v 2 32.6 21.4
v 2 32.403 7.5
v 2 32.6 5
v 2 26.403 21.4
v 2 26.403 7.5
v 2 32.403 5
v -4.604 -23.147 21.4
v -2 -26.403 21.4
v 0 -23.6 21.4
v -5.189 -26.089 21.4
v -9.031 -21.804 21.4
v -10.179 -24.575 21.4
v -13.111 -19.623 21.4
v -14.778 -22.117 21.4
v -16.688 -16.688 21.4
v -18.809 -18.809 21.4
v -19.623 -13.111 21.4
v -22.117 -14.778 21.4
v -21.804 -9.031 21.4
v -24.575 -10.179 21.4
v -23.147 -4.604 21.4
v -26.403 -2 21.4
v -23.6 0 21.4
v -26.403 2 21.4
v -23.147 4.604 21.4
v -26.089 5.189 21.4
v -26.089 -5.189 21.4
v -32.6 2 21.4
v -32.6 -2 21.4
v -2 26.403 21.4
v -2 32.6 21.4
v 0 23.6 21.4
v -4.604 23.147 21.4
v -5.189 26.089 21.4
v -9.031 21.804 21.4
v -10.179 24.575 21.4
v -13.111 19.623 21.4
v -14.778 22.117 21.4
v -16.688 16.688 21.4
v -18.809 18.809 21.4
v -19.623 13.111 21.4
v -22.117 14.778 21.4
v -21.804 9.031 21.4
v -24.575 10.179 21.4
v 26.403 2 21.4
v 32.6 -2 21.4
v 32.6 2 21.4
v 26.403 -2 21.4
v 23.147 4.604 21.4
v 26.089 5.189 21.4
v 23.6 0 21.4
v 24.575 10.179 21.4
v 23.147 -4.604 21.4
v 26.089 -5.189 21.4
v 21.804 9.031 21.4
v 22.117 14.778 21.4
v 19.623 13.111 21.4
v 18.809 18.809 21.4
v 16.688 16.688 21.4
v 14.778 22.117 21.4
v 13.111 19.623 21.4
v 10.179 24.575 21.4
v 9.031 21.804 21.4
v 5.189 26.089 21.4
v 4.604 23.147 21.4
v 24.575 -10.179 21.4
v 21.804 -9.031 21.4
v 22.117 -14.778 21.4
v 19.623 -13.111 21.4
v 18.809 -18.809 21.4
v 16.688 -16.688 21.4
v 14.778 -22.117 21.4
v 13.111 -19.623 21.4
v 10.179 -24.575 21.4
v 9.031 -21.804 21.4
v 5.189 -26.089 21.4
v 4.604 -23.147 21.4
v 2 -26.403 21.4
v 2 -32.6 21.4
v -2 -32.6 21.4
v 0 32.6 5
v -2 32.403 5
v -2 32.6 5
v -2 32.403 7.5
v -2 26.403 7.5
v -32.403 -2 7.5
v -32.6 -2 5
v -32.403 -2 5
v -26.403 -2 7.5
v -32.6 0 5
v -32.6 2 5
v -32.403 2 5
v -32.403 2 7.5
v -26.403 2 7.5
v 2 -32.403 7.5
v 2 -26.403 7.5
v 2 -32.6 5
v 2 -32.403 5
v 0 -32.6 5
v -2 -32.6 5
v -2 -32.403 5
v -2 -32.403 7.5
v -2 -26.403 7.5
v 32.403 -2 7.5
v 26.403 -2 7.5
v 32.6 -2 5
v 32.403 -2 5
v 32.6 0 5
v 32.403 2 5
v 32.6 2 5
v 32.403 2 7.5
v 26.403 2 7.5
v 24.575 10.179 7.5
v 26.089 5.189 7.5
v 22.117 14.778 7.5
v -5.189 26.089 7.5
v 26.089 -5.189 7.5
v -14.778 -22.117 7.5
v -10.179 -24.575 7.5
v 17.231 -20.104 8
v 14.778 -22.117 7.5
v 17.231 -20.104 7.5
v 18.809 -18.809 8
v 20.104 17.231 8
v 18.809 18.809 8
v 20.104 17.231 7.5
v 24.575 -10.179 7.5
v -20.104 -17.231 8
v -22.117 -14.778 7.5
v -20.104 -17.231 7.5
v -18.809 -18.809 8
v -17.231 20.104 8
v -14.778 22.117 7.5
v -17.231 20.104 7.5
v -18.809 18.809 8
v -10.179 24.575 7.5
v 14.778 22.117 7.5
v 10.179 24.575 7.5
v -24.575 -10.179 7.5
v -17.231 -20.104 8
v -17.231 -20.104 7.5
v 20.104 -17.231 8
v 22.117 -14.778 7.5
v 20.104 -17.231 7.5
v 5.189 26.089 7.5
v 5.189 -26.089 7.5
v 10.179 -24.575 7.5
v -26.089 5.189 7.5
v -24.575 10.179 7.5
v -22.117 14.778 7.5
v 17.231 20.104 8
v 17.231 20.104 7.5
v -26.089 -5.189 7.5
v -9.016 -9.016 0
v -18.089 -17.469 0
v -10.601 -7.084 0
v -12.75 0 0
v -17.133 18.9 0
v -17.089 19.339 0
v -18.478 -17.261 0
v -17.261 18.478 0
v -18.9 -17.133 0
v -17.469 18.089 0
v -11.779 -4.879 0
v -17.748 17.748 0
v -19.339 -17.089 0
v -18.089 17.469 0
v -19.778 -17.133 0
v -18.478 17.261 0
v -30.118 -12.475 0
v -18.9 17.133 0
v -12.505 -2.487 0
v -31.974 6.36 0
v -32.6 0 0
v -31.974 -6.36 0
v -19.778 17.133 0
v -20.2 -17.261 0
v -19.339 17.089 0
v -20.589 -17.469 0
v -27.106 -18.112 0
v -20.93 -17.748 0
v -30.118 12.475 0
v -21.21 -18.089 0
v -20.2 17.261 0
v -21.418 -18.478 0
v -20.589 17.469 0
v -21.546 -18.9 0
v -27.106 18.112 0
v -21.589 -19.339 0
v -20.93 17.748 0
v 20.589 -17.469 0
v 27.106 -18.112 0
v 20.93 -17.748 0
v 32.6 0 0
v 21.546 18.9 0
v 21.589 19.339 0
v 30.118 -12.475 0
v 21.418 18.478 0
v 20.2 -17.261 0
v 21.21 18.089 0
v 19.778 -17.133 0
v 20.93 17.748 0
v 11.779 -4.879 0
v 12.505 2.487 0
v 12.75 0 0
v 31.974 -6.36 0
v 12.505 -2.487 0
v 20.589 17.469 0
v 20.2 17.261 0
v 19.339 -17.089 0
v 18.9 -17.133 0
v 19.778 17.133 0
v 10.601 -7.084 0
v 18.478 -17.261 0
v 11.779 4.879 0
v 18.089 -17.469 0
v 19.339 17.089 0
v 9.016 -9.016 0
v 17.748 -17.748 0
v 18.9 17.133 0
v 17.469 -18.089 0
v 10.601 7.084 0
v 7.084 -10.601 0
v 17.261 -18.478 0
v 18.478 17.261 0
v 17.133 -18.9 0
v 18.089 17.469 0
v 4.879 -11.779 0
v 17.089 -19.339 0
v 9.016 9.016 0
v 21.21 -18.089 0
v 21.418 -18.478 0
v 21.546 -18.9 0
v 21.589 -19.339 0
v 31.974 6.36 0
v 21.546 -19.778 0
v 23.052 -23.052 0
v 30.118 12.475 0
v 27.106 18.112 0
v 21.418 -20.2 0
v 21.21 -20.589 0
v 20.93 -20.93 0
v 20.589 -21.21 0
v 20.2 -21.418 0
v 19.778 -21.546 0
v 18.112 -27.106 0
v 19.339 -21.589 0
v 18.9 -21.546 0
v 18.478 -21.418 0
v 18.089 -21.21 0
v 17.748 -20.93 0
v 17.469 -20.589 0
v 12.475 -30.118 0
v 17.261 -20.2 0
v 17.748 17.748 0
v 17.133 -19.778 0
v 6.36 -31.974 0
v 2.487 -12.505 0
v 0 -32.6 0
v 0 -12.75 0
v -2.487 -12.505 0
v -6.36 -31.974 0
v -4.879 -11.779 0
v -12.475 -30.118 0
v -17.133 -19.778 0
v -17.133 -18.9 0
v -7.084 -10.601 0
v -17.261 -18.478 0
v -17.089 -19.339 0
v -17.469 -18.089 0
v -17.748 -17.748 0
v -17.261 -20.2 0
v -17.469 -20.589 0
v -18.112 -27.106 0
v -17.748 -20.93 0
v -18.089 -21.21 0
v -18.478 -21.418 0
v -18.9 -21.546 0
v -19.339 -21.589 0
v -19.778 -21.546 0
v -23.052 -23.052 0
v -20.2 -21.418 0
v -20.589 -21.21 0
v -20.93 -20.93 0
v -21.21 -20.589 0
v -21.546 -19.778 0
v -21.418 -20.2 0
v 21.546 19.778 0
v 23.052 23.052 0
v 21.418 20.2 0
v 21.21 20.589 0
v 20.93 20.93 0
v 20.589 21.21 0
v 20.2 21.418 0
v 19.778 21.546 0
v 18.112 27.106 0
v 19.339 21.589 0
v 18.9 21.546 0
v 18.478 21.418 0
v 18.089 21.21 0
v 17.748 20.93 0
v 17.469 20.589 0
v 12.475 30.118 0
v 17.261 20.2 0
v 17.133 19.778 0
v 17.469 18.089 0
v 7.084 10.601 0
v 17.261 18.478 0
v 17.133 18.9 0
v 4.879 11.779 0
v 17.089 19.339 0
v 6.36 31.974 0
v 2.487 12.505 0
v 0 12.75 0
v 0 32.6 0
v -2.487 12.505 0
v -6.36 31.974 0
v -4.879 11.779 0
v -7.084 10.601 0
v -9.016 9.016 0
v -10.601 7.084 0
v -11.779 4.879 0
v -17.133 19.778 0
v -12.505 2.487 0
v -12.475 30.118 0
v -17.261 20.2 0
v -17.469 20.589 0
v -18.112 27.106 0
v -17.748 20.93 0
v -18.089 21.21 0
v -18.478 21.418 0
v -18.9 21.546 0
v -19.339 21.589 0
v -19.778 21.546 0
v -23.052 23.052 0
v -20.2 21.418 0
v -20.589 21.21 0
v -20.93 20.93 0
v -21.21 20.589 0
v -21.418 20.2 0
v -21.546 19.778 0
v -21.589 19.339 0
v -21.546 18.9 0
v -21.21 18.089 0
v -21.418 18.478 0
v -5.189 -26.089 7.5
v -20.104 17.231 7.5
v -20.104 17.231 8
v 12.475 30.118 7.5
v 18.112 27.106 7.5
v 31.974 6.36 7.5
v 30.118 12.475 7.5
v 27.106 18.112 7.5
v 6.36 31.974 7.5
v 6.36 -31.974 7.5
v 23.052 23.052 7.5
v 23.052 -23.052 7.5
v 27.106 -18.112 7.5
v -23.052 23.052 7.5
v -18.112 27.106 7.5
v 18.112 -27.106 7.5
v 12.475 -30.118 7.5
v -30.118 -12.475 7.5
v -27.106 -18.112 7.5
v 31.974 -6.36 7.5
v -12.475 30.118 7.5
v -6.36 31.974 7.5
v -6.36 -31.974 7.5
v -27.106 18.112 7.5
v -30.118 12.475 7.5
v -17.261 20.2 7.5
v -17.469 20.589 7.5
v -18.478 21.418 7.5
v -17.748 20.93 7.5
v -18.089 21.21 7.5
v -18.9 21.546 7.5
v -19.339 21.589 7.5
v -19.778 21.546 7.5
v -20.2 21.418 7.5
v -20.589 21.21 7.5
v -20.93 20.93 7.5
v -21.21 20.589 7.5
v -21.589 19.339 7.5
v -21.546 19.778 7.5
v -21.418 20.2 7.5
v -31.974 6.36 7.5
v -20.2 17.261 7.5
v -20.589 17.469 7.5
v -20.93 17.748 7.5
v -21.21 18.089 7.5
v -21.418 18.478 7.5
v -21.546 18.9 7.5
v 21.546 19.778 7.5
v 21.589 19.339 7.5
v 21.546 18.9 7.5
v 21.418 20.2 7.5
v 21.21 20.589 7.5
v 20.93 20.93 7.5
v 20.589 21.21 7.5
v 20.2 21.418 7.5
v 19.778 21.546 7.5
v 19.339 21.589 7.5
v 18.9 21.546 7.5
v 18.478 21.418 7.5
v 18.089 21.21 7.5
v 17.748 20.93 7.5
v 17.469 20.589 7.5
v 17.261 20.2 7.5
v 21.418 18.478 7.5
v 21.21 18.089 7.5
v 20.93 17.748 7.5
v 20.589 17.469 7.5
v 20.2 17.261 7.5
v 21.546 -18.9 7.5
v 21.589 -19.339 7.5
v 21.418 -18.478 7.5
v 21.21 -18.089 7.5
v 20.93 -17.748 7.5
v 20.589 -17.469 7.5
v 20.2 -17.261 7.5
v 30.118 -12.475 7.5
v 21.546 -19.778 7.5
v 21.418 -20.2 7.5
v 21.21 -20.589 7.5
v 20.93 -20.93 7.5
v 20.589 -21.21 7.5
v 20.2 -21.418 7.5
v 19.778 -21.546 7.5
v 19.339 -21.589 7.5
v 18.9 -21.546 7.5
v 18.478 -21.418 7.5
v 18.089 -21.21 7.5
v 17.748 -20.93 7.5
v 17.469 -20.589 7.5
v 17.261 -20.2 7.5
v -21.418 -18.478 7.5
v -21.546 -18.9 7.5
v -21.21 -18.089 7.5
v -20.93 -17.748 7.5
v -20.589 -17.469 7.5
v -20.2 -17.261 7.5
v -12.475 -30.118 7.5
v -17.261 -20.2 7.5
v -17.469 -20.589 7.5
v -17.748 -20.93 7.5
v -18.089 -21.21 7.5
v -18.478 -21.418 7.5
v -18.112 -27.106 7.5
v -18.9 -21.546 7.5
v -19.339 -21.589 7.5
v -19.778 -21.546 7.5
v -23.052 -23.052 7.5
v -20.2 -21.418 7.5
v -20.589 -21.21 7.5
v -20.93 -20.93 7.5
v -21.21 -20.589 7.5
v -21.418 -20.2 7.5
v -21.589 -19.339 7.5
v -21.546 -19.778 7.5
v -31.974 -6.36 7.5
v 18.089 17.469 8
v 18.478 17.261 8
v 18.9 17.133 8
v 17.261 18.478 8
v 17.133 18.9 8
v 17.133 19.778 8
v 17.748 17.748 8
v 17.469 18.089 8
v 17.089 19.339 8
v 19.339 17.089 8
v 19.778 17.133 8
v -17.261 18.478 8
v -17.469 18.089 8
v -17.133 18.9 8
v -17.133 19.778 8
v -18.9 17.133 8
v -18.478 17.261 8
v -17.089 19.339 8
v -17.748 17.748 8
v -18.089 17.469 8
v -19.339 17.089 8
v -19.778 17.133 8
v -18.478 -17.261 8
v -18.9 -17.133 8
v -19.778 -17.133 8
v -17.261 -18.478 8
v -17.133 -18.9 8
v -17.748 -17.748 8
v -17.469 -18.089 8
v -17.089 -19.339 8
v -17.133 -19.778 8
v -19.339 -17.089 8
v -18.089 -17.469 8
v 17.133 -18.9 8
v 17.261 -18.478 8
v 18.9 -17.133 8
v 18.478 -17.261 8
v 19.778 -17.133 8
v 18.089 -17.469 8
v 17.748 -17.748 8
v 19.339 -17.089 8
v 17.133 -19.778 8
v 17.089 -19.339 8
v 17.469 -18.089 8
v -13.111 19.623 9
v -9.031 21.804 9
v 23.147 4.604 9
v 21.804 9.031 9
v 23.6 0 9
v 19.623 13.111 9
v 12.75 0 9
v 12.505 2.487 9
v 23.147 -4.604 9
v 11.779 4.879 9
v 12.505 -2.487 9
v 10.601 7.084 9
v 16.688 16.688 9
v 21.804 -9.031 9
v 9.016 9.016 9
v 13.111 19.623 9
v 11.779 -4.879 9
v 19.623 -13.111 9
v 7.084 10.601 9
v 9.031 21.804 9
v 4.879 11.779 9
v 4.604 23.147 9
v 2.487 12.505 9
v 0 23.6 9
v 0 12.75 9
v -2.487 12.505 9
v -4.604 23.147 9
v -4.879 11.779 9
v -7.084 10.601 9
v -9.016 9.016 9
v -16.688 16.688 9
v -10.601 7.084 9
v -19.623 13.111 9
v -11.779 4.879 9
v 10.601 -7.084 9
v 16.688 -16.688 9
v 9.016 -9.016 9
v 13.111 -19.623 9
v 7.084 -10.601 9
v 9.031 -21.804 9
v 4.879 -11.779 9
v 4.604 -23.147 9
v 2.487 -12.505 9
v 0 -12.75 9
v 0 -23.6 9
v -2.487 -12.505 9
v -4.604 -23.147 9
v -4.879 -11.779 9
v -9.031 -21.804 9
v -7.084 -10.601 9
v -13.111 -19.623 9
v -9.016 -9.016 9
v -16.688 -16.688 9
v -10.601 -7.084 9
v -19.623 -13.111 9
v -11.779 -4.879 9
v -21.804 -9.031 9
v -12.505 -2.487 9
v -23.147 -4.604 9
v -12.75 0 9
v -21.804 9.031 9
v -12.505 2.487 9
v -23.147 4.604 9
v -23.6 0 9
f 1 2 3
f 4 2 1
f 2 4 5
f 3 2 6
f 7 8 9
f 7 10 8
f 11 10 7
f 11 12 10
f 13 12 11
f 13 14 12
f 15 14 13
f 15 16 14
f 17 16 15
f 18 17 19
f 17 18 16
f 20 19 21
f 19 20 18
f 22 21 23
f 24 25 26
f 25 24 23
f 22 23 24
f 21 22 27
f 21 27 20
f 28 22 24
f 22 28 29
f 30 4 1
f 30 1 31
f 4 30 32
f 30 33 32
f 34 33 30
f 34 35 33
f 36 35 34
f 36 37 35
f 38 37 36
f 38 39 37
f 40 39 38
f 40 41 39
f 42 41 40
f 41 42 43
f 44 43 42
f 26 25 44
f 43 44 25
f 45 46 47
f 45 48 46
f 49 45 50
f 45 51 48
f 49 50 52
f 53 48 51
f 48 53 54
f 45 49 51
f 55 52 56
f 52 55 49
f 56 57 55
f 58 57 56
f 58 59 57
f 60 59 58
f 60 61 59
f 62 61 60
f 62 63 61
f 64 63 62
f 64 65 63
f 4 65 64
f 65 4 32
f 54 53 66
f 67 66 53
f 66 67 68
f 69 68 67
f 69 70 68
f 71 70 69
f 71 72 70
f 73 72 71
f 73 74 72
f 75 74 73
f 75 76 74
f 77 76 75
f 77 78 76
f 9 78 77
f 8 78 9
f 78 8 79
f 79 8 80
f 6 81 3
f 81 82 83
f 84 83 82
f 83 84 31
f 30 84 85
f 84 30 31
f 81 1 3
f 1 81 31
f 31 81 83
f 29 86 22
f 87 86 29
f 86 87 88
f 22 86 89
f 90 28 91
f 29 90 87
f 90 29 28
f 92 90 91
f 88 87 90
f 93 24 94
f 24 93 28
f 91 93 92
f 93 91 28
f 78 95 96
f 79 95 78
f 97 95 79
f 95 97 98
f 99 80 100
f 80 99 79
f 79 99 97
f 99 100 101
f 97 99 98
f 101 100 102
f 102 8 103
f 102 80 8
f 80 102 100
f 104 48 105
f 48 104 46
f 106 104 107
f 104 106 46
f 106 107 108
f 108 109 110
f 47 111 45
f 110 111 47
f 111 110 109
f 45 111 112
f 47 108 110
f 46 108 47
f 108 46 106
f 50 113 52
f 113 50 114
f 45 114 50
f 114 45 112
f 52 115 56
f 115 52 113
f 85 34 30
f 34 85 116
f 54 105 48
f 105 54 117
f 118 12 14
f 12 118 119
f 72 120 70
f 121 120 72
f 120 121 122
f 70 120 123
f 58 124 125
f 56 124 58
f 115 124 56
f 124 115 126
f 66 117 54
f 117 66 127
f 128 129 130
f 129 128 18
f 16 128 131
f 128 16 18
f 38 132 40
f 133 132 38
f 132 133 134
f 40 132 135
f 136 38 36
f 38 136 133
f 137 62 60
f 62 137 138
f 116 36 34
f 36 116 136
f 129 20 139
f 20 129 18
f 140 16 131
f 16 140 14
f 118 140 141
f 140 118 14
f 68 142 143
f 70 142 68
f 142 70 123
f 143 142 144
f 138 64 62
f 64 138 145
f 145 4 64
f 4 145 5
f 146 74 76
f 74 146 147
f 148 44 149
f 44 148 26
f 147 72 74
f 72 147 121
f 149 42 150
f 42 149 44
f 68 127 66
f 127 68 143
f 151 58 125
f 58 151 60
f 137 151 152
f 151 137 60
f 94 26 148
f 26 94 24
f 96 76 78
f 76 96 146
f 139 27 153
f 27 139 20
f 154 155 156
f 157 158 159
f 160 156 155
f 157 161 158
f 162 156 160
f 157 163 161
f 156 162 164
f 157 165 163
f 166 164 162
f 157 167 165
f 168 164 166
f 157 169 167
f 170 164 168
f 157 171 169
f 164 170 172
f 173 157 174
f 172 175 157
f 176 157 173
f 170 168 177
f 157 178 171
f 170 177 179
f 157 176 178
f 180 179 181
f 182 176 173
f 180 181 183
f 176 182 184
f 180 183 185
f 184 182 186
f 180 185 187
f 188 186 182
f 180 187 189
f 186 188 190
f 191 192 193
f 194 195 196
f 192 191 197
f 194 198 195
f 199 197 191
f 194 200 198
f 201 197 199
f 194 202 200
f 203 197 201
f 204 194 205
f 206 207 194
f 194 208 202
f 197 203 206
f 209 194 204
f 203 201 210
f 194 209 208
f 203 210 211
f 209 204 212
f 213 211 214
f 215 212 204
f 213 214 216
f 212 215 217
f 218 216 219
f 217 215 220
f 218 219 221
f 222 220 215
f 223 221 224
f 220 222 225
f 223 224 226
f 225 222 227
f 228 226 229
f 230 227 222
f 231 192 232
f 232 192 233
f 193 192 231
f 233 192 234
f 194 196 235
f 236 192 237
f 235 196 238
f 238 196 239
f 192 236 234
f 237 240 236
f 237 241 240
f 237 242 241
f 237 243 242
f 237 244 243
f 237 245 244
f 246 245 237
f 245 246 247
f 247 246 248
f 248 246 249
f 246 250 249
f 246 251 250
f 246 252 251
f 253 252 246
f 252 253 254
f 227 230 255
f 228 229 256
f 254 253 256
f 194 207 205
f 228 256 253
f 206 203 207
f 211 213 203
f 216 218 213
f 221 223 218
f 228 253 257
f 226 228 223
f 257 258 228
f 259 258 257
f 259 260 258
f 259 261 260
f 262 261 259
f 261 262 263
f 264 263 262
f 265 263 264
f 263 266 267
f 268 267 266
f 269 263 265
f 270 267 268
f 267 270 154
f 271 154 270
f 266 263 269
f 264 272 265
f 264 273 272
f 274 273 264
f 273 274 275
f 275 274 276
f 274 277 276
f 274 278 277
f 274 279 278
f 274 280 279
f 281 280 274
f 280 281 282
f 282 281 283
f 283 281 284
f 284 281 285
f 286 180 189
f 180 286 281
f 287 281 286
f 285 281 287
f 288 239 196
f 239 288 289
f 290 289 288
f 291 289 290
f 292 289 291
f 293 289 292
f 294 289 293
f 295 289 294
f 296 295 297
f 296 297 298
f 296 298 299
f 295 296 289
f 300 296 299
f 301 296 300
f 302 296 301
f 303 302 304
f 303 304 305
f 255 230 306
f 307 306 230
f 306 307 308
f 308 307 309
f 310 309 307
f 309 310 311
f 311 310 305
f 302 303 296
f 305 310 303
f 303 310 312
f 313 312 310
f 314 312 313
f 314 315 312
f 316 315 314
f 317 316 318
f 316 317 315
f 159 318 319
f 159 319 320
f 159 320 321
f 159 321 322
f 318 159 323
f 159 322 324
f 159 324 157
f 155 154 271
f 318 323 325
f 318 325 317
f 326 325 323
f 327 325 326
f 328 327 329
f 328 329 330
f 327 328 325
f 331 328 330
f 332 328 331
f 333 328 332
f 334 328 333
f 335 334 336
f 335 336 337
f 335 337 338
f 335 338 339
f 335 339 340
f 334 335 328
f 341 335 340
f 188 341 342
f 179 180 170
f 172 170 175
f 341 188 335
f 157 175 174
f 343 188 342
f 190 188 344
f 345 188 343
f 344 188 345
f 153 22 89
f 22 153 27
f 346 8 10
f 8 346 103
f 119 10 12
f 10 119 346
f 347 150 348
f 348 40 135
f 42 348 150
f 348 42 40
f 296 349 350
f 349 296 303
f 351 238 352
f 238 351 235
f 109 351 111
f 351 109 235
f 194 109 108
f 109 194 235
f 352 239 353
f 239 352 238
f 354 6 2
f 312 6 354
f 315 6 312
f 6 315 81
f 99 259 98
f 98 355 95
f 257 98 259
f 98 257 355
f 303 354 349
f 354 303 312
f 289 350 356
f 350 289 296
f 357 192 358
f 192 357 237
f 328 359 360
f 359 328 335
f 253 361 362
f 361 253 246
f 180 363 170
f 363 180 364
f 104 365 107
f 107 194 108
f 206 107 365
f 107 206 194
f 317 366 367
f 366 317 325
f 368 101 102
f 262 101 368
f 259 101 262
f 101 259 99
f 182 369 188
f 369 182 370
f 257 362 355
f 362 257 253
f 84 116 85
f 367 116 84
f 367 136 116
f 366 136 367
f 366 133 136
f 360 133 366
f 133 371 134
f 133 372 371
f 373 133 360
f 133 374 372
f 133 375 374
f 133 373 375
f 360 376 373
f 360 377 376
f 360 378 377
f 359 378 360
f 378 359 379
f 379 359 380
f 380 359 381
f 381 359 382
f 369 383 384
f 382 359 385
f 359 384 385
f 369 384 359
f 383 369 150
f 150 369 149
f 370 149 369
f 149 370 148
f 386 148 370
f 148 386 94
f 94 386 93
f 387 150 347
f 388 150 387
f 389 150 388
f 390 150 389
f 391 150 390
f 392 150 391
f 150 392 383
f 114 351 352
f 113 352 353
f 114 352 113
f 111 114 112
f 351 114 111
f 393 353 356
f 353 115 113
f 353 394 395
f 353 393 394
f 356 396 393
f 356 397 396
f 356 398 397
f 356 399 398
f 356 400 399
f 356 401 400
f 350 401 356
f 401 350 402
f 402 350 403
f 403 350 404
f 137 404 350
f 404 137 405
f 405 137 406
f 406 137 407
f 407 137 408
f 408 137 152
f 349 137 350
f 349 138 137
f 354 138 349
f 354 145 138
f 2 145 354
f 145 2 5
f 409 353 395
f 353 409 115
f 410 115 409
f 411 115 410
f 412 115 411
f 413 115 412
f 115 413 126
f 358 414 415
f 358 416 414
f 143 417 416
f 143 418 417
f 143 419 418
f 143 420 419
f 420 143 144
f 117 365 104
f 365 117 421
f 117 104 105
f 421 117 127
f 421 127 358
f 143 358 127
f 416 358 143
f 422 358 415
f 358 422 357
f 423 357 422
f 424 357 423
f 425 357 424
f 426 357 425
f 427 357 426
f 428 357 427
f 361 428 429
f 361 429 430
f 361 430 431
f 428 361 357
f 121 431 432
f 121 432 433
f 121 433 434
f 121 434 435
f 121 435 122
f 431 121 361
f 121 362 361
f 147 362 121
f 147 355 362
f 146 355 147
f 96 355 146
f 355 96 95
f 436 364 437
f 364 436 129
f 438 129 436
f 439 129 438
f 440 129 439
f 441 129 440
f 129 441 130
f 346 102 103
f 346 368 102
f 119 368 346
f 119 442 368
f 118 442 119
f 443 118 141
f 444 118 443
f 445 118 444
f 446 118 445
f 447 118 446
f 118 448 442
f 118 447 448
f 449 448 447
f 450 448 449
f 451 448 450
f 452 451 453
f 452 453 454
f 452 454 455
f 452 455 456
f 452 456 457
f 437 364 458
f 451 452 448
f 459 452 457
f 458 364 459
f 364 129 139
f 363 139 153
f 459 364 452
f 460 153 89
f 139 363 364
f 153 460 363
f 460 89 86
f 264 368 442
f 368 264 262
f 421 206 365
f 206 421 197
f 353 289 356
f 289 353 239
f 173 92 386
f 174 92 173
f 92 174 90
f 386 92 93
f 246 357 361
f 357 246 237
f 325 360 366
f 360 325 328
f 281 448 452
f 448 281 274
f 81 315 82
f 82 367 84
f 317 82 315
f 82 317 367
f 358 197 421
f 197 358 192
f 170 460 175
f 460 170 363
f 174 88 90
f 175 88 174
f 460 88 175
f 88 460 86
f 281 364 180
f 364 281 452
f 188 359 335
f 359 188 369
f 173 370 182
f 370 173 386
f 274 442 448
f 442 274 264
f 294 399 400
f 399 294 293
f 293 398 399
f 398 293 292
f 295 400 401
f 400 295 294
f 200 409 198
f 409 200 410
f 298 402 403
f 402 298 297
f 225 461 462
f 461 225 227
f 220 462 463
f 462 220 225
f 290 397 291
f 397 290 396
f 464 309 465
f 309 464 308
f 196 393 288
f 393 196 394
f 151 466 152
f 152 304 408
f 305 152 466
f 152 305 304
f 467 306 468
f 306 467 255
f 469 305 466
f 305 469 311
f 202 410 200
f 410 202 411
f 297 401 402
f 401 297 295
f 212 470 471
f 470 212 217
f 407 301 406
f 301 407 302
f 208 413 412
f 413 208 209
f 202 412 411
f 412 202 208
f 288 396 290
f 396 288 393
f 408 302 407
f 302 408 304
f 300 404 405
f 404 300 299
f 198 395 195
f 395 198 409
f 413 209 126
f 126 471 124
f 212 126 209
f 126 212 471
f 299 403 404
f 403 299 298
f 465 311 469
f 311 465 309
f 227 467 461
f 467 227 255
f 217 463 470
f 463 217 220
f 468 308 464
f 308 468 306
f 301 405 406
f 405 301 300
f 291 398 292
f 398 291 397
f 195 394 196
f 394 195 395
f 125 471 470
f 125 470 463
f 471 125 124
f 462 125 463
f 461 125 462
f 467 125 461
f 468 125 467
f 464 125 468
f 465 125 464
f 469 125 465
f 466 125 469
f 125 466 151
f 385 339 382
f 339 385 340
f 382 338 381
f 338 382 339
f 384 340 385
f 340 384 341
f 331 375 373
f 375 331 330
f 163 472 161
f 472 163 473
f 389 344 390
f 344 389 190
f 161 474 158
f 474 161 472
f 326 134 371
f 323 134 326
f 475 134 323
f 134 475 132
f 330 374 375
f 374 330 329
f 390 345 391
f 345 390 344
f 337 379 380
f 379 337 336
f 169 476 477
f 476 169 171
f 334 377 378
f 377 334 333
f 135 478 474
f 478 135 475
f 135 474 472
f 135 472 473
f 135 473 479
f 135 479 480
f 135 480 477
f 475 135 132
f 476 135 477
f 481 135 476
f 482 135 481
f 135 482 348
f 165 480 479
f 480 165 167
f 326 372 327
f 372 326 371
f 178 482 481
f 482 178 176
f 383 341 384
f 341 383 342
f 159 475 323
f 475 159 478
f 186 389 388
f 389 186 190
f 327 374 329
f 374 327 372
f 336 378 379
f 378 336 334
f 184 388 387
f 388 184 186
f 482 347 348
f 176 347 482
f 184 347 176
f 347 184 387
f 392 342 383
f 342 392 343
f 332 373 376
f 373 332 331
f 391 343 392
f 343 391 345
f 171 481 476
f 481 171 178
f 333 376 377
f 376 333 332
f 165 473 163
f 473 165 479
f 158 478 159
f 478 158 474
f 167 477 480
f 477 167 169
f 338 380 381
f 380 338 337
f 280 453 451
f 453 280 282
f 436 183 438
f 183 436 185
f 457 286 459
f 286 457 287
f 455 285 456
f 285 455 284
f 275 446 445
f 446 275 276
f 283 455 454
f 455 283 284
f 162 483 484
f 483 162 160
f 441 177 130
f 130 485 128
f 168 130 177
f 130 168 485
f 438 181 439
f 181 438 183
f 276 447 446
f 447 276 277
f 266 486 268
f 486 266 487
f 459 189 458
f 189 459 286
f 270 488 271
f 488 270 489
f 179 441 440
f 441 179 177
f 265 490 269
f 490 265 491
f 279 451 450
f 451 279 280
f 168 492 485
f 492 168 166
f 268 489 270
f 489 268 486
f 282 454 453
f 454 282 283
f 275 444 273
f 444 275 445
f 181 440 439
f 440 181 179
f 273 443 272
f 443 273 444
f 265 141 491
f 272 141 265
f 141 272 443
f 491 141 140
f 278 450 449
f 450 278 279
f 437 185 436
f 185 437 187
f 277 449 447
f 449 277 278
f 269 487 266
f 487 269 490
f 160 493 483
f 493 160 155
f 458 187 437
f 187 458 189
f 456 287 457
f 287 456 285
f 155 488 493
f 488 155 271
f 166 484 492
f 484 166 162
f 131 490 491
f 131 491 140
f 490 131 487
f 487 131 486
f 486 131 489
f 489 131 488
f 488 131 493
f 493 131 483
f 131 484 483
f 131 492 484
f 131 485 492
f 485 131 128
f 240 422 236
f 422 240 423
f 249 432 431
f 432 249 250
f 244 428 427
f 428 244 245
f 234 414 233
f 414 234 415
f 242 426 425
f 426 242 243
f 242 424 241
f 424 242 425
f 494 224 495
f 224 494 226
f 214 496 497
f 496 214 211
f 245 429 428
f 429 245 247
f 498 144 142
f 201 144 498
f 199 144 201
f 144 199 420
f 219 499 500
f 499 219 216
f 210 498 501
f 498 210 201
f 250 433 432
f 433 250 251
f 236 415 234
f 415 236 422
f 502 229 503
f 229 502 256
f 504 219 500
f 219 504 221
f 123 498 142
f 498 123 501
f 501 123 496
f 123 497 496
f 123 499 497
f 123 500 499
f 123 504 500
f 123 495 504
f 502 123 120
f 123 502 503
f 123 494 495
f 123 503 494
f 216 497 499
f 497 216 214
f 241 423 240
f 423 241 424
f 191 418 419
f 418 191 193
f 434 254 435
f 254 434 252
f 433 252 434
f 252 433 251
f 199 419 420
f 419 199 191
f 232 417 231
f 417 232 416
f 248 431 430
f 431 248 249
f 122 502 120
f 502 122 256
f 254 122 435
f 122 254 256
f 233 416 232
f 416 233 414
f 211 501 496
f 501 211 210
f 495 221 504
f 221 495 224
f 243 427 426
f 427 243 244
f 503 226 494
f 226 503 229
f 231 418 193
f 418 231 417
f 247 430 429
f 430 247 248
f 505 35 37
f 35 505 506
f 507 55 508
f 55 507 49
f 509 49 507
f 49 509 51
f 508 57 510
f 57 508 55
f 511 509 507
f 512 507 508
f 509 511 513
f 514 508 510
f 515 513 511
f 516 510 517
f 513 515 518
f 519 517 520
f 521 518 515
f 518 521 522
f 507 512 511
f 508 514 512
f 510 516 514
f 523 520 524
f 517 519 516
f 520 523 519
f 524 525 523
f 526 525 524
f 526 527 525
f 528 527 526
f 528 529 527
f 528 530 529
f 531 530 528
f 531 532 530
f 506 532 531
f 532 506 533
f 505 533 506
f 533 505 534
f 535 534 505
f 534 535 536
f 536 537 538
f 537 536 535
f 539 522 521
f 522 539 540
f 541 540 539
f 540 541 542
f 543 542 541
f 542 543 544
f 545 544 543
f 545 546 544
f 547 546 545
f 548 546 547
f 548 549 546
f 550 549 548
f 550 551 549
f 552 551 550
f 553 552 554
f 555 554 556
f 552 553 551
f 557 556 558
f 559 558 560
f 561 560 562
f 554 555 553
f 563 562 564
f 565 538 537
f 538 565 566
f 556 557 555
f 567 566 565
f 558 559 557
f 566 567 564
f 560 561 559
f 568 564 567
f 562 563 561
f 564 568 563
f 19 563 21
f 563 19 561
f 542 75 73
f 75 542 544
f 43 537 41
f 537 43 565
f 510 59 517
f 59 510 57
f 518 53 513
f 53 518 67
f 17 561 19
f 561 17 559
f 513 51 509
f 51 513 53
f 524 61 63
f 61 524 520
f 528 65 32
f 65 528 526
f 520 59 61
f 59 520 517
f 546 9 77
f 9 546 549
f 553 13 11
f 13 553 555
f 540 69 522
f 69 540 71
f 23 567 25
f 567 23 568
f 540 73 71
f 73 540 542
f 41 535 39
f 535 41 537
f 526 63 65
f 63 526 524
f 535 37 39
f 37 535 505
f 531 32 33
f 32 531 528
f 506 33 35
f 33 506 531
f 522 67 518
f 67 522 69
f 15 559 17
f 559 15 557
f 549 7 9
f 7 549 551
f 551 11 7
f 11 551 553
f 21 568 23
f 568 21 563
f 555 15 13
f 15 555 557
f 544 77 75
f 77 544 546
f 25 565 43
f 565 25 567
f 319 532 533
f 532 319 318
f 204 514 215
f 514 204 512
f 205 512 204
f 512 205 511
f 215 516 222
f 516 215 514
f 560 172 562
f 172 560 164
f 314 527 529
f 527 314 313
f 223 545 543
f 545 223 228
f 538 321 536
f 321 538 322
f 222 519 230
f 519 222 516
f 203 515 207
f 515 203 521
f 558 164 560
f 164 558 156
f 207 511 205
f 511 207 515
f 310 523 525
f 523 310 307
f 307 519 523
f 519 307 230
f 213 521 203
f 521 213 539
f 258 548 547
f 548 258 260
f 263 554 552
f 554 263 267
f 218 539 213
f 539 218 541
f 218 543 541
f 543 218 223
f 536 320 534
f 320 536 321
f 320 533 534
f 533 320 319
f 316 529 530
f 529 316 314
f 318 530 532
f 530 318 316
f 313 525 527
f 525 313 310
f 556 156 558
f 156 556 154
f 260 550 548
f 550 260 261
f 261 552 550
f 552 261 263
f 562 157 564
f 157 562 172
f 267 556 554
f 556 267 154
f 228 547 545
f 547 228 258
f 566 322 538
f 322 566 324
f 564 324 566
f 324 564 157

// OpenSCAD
$fn = 32;

// ----------------------------------------------------------------------
// Bearing housing: seat for 6005 (47 x 12 mm), 53.2 mm body
// ----------------------------------------------------------------------

// --- parameters (mm) ---
body_od = 53.2;           // housing outside diameter
body_h = 21.4;            // overall housing height
wall = 3;                 // wall thickness
pocket_d = 47.2;          // 6005 seat, 0.2 mm clearance
seat_h = 12.4;            // pocket depth
shoulder = 3;             // shoulder under the bearing
pass_d = 25.5;            // shaft passage
flange_dia = 65.2;        // mounting flange diameter
flange_t = 6;             // flange thickness
bolt_d = 4.5;             // flange bolt clearance
bolt_r = 27.35;           // flange bolt circle radius
rib_w = 4;                // rib width
rib_n = 4;                // rib count

module body() {
  cylinder(h = body_h, d = body_od);
}

module flange() {
  /* flange sunk 1.5 mm into the body */
  cylinder(h = flange_t + 1.5, d = flange_dia);
}

module ribs() {
  for (i = [0 : rib_n - 1])
    rotate([0, 0, i * 360 / rib_n])
      translate([-rib_w / 2, body_od / 2 - 0.8, flange_t - 1])
        cube([rib_w, (flange_dia - body_od) / 2 + 0.8, body_h - flange_t + 1]);
}

difference() {
  union() {
    body();
    flange();
    ribs();
  }
  translate([0, 0, body_h - seat_h]) cylinder(h = seat_h + 1, d = pocket_d);
  translate([0, 0, -1]) cylinder(h = body_h - seat_h + 1, d = pass_d);
  for (i = [0 : 3]) rotate([0, 0, 45 + i * 90]) translate([bolt_r, 0, -1])
    cylinder(h = flange_t + 3, d = bolt_d);
}
